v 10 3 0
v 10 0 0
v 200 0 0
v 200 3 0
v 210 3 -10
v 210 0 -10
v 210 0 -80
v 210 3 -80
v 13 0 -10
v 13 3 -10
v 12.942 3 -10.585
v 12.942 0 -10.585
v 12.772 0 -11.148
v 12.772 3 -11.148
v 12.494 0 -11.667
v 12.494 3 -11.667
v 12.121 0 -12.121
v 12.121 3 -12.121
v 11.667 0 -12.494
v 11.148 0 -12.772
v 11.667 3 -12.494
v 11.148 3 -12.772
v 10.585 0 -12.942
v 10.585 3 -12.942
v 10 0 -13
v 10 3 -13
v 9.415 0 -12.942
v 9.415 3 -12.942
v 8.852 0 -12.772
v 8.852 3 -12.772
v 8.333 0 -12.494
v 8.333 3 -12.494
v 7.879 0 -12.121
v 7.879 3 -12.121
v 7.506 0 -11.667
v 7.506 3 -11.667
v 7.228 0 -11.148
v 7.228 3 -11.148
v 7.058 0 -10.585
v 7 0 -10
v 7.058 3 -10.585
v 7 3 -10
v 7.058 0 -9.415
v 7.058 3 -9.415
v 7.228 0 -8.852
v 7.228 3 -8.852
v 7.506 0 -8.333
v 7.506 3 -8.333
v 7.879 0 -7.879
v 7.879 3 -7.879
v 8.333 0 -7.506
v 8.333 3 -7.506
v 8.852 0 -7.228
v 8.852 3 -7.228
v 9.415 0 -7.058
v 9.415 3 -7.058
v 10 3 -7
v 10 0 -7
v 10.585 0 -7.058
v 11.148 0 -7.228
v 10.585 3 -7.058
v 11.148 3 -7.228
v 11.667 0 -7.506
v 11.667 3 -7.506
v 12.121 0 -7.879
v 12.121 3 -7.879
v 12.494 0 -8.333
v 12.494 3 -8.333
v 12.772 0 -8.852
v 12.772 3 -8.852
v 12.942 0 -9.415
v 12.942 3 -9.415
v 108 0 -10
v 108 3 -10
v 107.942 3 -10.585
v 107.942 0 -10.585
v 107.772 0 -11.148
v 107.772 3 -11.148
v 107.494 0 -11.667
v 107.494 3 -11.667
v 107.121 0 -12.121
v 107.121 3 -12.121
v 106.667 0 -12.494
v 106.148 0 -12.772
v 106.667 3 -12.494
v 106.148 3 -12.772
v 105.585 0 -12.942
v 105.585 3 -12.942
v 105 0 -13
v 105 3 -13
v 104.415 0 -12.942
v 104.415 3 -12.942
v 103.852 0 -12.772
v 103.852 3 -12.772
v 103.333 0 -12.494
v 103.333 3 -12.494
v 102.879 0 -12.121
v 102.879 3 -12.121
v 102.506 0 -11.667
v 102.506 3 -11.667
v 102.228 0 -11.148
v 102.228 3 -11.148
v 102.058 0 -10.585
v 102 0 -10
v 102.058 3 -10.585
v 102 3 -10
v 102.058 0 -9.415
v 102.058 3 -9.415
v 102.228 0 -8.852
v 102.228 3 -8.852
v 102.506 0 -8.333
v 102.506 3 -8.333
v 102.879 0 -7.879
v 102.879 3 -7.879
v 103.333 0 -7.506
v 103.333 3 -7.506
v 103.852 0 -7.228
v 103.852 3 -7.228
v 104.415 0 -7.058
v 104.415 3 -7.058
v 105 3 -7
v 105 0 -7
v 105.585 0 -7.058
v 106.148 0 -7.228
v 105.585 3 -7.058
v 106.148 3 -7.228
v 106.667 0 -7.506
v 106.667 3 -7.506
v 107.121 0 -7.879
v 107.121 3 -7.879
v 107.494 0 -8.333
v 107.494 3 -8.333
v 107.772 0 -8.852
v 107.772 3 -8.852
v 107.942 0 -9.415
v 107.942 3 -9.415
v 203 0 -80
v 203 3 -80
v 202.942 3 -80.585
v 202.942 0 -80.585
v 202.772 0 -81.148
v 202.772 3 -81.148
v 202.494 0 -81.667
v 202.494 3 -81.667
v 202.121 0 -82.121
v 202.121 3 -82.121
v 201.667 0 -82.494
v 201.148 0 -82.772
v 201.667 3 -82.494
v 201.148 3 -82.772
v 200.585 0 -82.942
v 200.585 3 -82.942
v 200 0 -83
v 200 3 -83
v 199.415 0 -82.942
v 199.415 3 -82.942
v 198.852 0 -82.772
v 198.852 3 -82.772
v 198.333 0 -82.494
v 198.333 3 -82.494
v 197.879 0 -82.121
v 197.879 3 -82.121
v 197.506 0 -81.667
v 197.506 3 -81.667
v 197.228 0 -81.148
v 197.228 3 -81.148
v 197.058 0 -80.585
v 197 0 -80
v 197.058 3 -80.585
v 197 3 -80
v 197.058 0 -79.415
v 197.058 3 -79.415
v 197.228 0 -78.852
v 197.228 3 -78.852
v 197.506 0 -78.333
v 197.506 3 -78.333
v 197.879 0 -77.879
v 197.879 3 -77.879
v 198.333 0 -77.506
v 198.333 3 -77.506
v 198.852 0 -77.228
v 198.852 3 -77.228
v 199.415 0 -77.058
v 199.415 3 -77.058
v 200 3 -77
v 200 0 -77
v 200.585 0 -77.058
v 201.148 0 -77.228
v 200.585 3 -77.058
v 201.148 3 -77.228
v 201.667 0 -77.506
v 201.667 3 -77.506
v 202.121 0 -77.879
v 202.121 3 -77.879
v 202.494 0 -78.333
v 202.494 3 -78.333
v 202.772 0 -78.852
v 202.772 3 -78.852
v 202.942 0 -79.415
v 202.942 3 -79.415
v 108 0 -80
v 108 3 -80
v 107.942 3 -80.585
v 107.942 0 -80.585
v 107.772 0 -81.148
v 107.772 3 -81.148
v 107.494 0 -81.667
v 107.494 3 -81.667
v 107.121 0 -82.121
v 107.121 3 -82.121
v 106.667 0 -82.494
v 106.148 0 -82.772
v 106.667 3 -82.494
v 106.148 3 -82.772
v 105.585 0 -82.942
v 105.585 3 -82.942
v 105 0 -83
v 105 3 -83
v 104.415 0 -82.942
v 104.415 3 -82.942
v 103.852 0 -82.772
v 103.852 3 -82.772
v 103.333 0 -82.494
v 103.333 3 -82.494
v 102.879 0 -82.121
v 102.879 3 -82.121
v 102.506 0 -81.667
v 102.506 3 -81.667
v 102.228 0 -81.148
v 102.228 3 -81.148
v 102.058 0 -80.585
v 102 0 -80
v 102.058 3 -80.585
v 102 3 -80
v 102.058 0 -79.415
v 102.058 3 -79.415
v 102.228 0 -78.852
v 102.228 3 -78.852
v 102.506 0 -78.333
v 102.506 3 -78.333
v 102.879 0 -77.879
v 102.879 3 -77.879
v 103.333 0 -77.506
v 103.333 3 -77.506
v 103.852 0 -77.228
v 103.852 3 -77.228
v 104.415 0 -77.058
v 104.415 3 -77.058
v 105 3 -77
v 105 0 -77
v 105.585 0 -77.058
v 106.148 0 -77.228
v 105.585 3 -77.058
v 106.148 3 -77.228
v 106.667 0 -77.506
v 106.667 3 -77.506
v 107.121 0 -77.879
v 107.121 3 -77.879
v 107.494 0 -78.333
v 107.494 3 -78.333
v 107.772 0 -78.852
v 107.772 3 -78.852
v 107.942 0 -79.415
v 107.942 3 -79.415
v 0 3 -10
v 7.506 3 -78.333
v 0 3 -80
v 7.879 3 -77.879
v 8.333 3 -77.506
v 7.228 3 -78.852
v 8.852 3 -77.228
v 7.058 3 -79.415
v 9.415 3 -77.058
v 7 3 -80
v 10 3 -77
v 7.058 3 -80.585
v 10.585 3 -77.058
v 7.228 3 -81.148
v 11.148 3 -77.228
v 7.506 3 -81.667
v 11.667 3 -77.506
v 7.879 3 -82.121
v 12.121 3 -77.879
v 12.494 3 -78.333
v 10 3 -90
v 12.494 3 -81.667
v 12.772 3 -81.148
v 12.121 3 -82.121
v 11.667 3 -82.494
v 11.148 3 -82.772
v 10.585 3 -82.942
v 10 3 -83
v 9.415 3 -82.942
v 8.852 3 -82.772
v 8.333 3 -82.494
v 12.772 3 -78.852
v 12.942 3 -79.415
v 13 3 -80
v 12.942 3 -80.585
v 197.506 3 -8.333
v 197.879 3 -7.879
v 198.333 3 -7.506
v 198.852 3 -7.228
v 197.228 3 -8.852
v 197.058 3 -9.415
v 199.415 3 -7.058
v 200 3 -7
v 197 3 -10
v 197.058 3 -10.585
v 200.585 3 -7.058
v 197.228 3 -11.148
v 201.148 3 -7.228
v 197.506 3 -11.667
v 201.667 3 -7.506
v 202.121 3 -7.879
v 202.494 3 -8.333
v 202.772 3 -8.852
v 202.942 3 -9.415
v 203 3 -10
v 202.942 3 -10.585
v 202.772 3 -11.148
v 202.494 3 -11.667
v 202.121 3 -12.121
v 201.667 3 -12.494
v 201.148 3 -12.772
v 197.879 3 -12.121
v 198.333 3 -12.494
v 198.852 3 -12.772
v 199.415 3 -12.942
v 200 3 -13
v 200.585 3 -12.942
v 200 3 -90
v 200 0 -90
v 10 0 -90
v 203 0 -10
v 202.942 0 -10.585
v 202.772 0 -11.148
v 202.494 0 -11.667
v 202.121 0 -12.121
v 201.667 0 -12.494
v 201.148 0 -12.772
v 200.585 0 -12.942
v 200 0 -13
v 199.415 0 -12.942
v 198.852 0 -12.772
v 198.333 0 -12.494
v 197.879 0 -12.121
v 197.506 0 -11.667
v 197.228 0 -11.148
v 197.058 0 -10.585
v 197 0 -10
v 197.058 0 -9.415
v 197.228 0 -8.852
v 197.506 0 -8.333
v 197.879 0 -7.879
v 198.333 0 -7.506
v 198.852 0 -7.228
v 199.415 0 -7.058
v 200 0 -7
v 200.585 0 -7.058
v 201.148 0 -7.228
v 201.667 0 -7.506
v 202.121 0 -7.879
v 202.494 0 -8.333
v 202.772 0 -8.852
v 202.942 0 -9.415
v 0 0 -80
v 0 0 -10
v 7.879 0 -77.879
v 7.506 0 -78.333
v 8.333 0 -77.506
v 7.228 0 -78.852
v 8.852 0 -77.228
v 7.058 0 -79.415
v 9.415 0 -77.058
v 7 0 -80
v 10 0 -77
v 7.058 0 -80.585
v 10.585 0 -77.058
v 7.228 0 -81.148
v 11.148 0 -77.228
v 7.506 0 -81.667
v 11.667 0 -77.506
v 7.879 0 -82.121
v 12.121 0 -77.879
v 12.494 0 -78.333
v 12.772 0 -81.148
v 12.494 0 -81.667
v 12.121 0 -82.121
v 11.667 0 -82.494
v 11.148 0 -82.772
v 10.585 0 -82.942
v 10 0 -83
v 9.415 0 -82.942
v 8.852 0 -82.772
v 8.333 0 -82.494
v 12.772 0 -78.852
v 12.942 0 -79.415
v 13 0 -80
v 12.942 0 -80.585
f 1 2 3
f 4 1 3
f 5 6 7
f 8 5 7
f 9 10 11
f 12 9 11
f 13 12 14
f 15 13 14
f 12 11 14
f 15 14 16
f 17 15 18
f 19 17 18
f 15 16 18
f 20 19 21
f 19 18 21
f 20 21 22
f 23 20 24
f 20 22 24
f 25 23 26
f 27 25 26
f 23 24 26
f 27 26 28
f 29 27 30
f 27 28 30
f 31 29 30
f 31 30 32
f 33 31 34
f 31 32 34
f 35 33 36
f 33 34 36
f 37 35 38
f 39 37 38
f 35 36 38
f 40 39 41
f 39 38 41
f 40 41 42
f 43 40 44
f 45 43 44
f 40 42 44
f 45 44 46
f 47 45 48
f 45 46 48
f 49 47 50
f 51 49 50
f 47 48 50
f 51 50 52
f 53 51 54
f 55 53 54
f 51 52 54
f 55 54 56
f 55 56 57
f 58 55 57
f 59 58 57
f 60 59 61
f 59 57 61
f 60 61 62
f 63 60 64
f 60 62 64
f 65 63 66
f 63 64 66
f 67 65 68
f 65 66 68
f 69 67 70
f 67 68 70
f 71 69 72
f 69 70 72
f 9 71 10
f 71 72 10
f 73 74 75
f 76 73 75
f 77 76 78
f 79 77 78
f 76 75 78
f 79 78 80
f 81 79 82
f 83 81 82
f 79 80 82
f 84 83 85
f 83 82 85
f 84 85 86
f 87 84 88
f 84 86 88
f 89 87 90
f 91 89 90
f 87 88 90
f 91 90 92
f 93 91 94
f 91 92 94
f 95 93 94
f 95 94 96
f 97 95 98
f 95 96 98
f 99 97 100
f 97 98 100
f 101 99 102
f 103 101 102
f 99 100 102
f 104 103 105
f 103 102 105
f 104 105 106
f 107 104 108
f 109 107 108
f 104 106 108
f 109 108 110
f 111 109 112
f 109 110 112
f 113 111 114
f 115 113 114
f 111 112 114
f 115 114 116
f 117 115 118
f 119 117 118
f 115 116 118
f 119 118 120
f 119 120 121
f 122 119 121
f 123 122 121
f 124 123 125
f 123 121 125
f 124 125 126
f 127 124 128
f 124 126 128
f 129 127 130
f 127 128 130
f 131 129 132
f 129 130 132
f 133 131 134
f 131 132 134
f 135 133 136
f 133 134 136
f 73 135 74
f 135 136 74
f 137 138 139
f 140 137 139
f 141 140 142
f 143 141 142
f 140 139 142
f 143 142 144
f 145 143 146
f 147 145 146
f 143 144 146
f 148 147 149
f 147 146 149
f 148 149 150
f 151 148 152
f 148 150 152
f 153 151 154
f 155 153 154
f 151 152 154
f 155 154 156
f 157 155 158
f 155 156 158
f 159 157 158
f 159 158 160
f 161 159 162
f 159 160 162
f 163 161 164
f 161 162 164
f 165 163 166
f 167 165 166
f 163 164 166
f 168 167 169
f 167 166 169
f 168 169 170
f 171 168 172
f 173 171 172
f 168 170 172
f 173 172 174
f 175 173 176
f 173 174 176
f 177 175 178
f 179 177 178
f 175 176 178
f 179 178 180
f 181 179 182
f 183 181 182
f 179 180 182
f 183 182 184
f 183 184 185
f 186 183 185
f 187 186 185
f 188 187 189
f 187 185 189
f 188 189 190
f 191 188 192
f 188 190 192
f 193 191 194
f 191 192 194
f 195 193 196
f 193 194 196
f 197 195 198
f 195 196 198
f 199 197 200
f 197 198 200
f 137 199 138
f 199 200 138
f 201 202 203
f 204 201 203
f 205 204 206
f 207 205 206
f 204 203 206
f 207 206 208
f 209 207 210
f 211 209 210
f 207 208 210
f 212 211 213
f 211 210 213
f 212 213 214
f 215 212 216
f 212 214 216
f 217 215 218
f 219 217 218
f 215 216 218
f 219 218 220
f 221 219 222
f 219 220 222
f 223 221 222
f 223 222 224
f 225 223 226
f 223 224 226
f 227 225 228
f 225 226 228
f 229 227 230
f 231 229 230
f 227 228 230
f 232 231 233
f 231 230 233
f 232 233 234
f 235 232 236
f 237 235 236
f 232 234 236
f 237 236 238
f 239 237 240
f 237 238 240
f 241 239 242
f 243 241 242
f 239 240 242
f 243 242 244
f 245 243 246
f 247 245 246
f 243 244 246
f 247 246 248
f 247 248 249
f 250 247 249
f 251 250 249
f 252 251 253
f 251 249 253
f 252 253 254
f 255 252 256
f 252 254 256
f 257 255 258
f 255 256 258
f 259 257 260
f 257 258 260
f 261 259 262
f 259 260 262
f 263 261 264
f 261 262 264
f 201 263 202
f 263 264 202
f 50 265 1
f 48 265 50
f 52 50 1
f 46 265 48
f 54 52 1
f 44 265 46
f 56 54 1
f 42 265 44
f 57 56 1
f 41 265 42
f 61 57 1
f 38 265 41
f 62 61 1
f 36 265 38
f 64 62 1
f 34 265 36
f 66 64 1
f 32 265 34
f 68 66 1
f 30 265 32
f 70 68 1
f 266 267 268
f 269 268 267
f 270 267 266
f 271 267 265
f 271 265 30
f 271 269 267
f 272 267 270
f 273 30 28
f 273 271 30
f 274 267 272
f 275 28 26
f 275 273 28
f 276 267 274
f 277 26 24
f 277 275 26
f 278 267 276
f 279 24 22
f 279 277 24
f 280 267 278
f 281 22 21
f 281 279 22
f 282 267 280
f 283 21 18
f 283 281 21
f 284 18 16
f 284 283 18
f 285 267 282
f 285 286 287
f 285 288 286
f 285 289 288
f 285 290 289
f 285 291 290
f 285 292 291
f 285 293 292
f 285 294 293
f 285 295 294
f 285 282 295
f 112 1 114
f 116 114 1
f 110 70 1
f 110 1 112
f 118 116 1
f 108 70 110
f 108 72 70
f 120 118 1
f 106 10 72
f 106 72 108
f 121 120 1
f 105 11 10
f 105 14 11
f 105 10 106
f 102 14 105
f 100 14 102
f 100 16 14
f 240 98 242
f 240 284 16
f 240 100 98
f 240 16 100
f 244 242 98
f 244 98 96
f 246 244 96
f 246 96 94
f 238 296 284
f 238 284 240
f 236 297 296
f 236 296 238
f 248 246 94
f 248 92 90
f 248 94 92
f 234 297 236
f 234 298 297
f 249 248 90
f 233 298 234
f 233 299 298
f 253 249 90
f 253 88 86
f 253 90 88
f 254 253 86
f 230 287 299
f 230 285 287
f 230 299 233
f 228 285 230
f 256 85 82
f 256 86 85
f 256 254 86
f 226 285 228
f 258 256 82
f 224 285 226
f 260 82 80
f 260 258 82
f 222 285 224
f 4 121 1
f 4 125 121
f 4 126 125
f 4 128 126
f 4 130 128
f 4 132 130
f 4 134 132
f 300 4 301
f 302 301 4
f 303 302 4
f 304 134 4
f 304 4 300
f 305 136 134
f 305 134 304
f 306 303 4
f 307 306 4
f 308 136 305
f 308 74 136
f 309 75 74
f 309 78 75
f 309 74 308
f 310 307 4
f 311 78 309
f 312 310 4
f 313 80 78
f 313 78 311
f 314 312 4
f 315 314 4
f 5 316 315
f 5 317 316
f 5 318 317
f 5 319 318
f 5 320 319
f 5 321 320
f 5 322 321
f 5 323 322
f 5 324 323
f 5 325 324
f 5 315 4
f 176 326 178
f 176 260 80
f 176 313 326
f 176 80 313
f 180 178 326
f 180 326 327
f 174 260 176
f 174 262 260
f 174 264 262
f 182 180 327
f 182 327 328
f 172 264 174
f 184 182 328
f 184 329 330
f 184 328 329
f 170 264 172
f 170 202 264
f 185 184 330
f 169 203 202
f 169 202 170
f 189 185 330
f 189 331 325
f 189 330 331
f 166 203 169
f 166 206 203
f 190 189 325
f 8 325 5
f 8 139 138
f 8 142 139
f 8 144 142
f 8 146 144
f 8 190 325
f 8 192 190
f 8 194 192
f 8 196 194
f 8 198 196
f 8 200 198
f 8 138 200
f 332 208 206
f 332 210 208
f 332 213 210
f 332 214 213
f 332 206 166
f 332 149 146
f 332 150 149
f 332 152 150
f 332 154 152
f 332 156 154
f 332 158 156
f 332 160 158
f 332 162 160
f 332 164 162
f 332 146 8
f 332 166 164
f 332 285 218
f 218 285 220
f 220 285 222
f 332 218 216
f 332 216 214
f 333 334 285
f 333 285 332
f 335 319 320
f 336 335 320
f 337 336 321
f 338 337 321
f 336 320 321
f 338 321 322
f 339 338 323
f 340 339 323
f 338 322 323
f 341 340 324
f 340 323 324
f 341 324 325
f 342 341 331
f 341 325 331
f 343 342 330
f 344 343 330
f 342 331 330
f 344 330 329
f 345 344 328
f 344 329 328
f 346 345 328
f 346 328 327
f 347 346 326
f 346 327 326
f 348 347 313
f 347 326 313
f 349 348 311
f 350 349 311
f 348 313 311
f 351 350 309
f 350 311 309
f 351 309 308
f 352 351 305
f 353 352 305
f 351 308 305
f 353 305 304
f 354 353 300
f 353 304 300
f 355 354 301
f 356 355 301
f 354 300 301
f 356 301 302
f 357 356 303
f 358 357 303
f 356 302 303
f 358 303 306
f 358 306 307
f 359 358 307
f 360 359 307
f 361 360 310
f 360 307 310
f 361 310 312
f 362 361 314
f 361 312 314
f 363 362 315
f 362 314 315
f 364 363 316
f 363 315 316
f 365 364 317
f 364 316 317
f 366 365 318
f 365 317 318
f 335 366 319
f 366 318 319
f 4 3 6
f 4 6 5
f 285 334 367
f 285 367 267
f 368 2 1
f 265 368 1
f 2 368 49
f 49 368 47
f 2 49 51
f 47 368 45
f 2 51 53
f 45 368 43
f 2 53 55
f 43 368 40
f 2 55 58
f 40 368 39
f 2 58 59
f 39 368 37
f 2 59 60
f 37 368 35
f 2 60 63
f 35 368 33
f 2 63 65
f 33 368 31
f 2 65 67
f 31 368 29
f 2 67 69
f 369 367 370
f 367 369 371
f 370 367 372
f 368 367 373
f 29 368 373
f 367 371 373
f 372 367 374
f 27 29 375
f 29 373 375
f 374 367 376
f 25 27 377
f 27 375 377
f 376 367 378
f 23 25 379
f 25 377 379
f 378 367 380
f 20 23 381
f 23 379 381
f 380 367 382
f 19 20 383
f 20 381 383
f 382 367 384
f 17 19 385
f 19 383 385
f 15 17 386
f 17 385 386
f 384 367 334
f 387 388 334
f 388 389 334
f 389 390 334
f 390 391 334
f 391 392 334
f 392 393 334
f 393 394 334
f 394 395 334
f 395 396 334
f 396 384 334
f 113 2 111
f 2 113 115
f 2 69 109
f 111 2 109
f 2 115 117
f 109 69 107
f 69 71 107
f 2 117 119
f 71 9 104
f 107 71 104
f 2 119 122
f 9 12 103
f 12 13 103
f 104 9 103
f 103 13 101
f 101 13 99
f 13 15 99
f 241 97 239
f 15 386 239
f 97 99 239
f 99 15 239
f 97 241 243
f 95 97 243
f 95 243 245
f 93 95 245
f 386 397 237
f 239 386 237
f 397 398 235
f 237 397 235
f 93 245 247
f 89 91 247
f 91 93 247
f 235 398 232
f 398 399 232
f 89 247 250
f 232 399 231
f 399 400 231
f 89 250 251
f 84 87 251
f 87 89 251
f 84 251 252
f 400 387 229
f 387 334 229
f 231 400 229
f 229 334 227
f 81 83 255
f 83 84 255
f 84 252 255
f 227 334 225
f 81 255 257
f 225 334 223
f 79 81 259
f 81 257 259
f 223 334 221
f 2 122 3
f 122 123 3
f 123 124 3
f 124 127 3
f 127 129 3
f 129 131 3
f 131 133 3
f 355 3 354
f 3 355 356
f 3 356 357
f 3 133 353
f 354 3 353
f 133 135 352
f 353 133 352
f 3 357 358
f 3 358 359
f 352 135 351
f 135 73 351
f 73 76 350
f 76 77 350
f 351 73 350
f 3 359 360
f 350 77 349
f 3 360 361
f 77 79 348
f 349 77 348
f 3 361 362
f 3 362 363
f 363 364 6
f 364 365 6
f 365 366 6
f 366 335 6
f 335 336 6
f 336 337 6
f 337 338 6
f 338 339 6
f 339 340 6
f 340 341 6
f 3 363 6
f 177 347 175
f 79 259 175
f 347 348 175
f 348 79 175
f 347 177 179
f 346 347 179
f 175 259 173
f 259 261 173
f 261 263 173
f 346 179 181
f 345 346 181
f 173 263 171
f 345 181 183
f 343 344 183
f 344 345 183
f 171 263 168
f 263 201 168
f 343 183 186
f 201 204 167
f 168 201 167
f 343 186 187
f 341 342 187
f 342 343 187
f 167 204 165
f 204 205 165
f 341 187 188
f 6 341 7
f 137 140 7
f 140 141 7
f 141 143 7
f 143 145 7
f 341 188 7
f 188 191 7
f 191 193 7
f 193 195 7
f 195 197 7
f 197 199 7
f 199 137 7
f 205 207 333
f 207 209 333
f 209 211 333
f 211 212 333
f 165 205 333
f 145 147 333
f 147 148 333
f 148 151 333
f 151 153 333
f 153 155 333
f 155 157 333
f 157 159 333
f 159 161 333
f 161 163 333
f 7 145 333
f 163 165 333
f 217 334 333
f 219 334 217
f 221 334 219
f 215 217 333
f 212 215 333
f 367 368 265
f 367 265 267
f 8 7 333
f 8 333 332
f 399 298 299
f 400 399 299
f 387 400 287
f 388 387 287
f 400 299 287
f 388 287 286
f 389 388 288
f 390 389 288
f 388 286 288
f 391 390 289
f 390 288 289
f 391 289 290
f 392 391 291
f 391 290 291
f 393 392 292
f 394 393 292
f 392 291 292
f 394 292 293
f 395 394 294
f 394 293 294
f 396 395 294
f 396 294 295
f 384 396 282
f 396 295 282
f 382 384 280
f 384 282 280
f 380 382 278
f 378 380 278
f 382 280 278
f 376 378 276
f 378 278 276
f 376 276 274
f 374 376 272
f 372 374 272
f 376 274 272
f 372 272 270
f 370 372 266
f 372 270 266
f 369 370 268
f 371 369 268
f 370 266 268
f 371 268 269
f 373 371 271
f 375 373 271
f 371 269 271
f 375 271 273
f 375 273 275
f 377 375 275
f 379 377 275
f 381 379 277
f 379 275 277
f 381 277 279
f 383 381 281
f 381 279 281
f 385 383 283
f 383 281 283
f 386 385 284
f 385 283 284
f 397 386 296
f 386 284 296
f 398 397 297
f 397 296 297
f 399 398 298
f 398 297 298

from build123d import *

# Parameters (mm, degrees)
ESQUISSE1_W             = 210
ESQUISSE1_H             = 90
BOSS_EXTRU_1_DEPTH      = 3
ESQUISSE2_R             = 3
ENL_V_MAT_EXTRU_1_DEPTH = 3
CHAMFER1_SIZE           = 10


with BuildPart() as part:
    # Esquisse1 → Boss.-Extru.1 (new body)
    with BuildSketch(Plane(origin=(0, 0, 0), x_dir=(1, 0, 0), z_dir=(0, 1, 0))):
        with Locations((105, 45)):
            Rectangle(ESQUISSE1_W, ESQUISSE1_H)
    extrude(amount=BOSS_EXTRU_1_DEPTH)

    # Esquisse2 → Enlèv. mat.-Extru.1 (cut)
    with BuildSketch(Plane(origin=(0, 3, 0), x_dir=(1, 0, 0), z_dir=(0, 1, 0))):
        with Locations((10, 80)):
            Circle(ESQUISSE2_R)
        with Locations((105, 80)):
            Circle(ESQUISSE2_R)
        with Locations((200, 80)):
            Circle(ESQUISSE2_R)
        with Locations((200, 10)):
            Circle(ESQUISSE2_R)
        with Locations((105, 10)):
            Circle(ESQUISSE2_R)
        with Locations((10, 10)):
            Circle(ESQUISSE2_R)
    extrude(amount=-ENL_V_MAT_EXTRU_1_DEPTH, mode=Mode.SUBTRACT)

    # Chamfer1
    chamfer1_edges = [part.edges().sort_by_distance(p)[0] for p in [
        (210, 1.5, 0),
        (0, 1.5, 0),
        (0, 1.5, -90),
        (210, 1.5, -90),
    ]]
    chamfer(chamfer1_edges, length=CHAMFER1_SIZE)


solid = part.part
